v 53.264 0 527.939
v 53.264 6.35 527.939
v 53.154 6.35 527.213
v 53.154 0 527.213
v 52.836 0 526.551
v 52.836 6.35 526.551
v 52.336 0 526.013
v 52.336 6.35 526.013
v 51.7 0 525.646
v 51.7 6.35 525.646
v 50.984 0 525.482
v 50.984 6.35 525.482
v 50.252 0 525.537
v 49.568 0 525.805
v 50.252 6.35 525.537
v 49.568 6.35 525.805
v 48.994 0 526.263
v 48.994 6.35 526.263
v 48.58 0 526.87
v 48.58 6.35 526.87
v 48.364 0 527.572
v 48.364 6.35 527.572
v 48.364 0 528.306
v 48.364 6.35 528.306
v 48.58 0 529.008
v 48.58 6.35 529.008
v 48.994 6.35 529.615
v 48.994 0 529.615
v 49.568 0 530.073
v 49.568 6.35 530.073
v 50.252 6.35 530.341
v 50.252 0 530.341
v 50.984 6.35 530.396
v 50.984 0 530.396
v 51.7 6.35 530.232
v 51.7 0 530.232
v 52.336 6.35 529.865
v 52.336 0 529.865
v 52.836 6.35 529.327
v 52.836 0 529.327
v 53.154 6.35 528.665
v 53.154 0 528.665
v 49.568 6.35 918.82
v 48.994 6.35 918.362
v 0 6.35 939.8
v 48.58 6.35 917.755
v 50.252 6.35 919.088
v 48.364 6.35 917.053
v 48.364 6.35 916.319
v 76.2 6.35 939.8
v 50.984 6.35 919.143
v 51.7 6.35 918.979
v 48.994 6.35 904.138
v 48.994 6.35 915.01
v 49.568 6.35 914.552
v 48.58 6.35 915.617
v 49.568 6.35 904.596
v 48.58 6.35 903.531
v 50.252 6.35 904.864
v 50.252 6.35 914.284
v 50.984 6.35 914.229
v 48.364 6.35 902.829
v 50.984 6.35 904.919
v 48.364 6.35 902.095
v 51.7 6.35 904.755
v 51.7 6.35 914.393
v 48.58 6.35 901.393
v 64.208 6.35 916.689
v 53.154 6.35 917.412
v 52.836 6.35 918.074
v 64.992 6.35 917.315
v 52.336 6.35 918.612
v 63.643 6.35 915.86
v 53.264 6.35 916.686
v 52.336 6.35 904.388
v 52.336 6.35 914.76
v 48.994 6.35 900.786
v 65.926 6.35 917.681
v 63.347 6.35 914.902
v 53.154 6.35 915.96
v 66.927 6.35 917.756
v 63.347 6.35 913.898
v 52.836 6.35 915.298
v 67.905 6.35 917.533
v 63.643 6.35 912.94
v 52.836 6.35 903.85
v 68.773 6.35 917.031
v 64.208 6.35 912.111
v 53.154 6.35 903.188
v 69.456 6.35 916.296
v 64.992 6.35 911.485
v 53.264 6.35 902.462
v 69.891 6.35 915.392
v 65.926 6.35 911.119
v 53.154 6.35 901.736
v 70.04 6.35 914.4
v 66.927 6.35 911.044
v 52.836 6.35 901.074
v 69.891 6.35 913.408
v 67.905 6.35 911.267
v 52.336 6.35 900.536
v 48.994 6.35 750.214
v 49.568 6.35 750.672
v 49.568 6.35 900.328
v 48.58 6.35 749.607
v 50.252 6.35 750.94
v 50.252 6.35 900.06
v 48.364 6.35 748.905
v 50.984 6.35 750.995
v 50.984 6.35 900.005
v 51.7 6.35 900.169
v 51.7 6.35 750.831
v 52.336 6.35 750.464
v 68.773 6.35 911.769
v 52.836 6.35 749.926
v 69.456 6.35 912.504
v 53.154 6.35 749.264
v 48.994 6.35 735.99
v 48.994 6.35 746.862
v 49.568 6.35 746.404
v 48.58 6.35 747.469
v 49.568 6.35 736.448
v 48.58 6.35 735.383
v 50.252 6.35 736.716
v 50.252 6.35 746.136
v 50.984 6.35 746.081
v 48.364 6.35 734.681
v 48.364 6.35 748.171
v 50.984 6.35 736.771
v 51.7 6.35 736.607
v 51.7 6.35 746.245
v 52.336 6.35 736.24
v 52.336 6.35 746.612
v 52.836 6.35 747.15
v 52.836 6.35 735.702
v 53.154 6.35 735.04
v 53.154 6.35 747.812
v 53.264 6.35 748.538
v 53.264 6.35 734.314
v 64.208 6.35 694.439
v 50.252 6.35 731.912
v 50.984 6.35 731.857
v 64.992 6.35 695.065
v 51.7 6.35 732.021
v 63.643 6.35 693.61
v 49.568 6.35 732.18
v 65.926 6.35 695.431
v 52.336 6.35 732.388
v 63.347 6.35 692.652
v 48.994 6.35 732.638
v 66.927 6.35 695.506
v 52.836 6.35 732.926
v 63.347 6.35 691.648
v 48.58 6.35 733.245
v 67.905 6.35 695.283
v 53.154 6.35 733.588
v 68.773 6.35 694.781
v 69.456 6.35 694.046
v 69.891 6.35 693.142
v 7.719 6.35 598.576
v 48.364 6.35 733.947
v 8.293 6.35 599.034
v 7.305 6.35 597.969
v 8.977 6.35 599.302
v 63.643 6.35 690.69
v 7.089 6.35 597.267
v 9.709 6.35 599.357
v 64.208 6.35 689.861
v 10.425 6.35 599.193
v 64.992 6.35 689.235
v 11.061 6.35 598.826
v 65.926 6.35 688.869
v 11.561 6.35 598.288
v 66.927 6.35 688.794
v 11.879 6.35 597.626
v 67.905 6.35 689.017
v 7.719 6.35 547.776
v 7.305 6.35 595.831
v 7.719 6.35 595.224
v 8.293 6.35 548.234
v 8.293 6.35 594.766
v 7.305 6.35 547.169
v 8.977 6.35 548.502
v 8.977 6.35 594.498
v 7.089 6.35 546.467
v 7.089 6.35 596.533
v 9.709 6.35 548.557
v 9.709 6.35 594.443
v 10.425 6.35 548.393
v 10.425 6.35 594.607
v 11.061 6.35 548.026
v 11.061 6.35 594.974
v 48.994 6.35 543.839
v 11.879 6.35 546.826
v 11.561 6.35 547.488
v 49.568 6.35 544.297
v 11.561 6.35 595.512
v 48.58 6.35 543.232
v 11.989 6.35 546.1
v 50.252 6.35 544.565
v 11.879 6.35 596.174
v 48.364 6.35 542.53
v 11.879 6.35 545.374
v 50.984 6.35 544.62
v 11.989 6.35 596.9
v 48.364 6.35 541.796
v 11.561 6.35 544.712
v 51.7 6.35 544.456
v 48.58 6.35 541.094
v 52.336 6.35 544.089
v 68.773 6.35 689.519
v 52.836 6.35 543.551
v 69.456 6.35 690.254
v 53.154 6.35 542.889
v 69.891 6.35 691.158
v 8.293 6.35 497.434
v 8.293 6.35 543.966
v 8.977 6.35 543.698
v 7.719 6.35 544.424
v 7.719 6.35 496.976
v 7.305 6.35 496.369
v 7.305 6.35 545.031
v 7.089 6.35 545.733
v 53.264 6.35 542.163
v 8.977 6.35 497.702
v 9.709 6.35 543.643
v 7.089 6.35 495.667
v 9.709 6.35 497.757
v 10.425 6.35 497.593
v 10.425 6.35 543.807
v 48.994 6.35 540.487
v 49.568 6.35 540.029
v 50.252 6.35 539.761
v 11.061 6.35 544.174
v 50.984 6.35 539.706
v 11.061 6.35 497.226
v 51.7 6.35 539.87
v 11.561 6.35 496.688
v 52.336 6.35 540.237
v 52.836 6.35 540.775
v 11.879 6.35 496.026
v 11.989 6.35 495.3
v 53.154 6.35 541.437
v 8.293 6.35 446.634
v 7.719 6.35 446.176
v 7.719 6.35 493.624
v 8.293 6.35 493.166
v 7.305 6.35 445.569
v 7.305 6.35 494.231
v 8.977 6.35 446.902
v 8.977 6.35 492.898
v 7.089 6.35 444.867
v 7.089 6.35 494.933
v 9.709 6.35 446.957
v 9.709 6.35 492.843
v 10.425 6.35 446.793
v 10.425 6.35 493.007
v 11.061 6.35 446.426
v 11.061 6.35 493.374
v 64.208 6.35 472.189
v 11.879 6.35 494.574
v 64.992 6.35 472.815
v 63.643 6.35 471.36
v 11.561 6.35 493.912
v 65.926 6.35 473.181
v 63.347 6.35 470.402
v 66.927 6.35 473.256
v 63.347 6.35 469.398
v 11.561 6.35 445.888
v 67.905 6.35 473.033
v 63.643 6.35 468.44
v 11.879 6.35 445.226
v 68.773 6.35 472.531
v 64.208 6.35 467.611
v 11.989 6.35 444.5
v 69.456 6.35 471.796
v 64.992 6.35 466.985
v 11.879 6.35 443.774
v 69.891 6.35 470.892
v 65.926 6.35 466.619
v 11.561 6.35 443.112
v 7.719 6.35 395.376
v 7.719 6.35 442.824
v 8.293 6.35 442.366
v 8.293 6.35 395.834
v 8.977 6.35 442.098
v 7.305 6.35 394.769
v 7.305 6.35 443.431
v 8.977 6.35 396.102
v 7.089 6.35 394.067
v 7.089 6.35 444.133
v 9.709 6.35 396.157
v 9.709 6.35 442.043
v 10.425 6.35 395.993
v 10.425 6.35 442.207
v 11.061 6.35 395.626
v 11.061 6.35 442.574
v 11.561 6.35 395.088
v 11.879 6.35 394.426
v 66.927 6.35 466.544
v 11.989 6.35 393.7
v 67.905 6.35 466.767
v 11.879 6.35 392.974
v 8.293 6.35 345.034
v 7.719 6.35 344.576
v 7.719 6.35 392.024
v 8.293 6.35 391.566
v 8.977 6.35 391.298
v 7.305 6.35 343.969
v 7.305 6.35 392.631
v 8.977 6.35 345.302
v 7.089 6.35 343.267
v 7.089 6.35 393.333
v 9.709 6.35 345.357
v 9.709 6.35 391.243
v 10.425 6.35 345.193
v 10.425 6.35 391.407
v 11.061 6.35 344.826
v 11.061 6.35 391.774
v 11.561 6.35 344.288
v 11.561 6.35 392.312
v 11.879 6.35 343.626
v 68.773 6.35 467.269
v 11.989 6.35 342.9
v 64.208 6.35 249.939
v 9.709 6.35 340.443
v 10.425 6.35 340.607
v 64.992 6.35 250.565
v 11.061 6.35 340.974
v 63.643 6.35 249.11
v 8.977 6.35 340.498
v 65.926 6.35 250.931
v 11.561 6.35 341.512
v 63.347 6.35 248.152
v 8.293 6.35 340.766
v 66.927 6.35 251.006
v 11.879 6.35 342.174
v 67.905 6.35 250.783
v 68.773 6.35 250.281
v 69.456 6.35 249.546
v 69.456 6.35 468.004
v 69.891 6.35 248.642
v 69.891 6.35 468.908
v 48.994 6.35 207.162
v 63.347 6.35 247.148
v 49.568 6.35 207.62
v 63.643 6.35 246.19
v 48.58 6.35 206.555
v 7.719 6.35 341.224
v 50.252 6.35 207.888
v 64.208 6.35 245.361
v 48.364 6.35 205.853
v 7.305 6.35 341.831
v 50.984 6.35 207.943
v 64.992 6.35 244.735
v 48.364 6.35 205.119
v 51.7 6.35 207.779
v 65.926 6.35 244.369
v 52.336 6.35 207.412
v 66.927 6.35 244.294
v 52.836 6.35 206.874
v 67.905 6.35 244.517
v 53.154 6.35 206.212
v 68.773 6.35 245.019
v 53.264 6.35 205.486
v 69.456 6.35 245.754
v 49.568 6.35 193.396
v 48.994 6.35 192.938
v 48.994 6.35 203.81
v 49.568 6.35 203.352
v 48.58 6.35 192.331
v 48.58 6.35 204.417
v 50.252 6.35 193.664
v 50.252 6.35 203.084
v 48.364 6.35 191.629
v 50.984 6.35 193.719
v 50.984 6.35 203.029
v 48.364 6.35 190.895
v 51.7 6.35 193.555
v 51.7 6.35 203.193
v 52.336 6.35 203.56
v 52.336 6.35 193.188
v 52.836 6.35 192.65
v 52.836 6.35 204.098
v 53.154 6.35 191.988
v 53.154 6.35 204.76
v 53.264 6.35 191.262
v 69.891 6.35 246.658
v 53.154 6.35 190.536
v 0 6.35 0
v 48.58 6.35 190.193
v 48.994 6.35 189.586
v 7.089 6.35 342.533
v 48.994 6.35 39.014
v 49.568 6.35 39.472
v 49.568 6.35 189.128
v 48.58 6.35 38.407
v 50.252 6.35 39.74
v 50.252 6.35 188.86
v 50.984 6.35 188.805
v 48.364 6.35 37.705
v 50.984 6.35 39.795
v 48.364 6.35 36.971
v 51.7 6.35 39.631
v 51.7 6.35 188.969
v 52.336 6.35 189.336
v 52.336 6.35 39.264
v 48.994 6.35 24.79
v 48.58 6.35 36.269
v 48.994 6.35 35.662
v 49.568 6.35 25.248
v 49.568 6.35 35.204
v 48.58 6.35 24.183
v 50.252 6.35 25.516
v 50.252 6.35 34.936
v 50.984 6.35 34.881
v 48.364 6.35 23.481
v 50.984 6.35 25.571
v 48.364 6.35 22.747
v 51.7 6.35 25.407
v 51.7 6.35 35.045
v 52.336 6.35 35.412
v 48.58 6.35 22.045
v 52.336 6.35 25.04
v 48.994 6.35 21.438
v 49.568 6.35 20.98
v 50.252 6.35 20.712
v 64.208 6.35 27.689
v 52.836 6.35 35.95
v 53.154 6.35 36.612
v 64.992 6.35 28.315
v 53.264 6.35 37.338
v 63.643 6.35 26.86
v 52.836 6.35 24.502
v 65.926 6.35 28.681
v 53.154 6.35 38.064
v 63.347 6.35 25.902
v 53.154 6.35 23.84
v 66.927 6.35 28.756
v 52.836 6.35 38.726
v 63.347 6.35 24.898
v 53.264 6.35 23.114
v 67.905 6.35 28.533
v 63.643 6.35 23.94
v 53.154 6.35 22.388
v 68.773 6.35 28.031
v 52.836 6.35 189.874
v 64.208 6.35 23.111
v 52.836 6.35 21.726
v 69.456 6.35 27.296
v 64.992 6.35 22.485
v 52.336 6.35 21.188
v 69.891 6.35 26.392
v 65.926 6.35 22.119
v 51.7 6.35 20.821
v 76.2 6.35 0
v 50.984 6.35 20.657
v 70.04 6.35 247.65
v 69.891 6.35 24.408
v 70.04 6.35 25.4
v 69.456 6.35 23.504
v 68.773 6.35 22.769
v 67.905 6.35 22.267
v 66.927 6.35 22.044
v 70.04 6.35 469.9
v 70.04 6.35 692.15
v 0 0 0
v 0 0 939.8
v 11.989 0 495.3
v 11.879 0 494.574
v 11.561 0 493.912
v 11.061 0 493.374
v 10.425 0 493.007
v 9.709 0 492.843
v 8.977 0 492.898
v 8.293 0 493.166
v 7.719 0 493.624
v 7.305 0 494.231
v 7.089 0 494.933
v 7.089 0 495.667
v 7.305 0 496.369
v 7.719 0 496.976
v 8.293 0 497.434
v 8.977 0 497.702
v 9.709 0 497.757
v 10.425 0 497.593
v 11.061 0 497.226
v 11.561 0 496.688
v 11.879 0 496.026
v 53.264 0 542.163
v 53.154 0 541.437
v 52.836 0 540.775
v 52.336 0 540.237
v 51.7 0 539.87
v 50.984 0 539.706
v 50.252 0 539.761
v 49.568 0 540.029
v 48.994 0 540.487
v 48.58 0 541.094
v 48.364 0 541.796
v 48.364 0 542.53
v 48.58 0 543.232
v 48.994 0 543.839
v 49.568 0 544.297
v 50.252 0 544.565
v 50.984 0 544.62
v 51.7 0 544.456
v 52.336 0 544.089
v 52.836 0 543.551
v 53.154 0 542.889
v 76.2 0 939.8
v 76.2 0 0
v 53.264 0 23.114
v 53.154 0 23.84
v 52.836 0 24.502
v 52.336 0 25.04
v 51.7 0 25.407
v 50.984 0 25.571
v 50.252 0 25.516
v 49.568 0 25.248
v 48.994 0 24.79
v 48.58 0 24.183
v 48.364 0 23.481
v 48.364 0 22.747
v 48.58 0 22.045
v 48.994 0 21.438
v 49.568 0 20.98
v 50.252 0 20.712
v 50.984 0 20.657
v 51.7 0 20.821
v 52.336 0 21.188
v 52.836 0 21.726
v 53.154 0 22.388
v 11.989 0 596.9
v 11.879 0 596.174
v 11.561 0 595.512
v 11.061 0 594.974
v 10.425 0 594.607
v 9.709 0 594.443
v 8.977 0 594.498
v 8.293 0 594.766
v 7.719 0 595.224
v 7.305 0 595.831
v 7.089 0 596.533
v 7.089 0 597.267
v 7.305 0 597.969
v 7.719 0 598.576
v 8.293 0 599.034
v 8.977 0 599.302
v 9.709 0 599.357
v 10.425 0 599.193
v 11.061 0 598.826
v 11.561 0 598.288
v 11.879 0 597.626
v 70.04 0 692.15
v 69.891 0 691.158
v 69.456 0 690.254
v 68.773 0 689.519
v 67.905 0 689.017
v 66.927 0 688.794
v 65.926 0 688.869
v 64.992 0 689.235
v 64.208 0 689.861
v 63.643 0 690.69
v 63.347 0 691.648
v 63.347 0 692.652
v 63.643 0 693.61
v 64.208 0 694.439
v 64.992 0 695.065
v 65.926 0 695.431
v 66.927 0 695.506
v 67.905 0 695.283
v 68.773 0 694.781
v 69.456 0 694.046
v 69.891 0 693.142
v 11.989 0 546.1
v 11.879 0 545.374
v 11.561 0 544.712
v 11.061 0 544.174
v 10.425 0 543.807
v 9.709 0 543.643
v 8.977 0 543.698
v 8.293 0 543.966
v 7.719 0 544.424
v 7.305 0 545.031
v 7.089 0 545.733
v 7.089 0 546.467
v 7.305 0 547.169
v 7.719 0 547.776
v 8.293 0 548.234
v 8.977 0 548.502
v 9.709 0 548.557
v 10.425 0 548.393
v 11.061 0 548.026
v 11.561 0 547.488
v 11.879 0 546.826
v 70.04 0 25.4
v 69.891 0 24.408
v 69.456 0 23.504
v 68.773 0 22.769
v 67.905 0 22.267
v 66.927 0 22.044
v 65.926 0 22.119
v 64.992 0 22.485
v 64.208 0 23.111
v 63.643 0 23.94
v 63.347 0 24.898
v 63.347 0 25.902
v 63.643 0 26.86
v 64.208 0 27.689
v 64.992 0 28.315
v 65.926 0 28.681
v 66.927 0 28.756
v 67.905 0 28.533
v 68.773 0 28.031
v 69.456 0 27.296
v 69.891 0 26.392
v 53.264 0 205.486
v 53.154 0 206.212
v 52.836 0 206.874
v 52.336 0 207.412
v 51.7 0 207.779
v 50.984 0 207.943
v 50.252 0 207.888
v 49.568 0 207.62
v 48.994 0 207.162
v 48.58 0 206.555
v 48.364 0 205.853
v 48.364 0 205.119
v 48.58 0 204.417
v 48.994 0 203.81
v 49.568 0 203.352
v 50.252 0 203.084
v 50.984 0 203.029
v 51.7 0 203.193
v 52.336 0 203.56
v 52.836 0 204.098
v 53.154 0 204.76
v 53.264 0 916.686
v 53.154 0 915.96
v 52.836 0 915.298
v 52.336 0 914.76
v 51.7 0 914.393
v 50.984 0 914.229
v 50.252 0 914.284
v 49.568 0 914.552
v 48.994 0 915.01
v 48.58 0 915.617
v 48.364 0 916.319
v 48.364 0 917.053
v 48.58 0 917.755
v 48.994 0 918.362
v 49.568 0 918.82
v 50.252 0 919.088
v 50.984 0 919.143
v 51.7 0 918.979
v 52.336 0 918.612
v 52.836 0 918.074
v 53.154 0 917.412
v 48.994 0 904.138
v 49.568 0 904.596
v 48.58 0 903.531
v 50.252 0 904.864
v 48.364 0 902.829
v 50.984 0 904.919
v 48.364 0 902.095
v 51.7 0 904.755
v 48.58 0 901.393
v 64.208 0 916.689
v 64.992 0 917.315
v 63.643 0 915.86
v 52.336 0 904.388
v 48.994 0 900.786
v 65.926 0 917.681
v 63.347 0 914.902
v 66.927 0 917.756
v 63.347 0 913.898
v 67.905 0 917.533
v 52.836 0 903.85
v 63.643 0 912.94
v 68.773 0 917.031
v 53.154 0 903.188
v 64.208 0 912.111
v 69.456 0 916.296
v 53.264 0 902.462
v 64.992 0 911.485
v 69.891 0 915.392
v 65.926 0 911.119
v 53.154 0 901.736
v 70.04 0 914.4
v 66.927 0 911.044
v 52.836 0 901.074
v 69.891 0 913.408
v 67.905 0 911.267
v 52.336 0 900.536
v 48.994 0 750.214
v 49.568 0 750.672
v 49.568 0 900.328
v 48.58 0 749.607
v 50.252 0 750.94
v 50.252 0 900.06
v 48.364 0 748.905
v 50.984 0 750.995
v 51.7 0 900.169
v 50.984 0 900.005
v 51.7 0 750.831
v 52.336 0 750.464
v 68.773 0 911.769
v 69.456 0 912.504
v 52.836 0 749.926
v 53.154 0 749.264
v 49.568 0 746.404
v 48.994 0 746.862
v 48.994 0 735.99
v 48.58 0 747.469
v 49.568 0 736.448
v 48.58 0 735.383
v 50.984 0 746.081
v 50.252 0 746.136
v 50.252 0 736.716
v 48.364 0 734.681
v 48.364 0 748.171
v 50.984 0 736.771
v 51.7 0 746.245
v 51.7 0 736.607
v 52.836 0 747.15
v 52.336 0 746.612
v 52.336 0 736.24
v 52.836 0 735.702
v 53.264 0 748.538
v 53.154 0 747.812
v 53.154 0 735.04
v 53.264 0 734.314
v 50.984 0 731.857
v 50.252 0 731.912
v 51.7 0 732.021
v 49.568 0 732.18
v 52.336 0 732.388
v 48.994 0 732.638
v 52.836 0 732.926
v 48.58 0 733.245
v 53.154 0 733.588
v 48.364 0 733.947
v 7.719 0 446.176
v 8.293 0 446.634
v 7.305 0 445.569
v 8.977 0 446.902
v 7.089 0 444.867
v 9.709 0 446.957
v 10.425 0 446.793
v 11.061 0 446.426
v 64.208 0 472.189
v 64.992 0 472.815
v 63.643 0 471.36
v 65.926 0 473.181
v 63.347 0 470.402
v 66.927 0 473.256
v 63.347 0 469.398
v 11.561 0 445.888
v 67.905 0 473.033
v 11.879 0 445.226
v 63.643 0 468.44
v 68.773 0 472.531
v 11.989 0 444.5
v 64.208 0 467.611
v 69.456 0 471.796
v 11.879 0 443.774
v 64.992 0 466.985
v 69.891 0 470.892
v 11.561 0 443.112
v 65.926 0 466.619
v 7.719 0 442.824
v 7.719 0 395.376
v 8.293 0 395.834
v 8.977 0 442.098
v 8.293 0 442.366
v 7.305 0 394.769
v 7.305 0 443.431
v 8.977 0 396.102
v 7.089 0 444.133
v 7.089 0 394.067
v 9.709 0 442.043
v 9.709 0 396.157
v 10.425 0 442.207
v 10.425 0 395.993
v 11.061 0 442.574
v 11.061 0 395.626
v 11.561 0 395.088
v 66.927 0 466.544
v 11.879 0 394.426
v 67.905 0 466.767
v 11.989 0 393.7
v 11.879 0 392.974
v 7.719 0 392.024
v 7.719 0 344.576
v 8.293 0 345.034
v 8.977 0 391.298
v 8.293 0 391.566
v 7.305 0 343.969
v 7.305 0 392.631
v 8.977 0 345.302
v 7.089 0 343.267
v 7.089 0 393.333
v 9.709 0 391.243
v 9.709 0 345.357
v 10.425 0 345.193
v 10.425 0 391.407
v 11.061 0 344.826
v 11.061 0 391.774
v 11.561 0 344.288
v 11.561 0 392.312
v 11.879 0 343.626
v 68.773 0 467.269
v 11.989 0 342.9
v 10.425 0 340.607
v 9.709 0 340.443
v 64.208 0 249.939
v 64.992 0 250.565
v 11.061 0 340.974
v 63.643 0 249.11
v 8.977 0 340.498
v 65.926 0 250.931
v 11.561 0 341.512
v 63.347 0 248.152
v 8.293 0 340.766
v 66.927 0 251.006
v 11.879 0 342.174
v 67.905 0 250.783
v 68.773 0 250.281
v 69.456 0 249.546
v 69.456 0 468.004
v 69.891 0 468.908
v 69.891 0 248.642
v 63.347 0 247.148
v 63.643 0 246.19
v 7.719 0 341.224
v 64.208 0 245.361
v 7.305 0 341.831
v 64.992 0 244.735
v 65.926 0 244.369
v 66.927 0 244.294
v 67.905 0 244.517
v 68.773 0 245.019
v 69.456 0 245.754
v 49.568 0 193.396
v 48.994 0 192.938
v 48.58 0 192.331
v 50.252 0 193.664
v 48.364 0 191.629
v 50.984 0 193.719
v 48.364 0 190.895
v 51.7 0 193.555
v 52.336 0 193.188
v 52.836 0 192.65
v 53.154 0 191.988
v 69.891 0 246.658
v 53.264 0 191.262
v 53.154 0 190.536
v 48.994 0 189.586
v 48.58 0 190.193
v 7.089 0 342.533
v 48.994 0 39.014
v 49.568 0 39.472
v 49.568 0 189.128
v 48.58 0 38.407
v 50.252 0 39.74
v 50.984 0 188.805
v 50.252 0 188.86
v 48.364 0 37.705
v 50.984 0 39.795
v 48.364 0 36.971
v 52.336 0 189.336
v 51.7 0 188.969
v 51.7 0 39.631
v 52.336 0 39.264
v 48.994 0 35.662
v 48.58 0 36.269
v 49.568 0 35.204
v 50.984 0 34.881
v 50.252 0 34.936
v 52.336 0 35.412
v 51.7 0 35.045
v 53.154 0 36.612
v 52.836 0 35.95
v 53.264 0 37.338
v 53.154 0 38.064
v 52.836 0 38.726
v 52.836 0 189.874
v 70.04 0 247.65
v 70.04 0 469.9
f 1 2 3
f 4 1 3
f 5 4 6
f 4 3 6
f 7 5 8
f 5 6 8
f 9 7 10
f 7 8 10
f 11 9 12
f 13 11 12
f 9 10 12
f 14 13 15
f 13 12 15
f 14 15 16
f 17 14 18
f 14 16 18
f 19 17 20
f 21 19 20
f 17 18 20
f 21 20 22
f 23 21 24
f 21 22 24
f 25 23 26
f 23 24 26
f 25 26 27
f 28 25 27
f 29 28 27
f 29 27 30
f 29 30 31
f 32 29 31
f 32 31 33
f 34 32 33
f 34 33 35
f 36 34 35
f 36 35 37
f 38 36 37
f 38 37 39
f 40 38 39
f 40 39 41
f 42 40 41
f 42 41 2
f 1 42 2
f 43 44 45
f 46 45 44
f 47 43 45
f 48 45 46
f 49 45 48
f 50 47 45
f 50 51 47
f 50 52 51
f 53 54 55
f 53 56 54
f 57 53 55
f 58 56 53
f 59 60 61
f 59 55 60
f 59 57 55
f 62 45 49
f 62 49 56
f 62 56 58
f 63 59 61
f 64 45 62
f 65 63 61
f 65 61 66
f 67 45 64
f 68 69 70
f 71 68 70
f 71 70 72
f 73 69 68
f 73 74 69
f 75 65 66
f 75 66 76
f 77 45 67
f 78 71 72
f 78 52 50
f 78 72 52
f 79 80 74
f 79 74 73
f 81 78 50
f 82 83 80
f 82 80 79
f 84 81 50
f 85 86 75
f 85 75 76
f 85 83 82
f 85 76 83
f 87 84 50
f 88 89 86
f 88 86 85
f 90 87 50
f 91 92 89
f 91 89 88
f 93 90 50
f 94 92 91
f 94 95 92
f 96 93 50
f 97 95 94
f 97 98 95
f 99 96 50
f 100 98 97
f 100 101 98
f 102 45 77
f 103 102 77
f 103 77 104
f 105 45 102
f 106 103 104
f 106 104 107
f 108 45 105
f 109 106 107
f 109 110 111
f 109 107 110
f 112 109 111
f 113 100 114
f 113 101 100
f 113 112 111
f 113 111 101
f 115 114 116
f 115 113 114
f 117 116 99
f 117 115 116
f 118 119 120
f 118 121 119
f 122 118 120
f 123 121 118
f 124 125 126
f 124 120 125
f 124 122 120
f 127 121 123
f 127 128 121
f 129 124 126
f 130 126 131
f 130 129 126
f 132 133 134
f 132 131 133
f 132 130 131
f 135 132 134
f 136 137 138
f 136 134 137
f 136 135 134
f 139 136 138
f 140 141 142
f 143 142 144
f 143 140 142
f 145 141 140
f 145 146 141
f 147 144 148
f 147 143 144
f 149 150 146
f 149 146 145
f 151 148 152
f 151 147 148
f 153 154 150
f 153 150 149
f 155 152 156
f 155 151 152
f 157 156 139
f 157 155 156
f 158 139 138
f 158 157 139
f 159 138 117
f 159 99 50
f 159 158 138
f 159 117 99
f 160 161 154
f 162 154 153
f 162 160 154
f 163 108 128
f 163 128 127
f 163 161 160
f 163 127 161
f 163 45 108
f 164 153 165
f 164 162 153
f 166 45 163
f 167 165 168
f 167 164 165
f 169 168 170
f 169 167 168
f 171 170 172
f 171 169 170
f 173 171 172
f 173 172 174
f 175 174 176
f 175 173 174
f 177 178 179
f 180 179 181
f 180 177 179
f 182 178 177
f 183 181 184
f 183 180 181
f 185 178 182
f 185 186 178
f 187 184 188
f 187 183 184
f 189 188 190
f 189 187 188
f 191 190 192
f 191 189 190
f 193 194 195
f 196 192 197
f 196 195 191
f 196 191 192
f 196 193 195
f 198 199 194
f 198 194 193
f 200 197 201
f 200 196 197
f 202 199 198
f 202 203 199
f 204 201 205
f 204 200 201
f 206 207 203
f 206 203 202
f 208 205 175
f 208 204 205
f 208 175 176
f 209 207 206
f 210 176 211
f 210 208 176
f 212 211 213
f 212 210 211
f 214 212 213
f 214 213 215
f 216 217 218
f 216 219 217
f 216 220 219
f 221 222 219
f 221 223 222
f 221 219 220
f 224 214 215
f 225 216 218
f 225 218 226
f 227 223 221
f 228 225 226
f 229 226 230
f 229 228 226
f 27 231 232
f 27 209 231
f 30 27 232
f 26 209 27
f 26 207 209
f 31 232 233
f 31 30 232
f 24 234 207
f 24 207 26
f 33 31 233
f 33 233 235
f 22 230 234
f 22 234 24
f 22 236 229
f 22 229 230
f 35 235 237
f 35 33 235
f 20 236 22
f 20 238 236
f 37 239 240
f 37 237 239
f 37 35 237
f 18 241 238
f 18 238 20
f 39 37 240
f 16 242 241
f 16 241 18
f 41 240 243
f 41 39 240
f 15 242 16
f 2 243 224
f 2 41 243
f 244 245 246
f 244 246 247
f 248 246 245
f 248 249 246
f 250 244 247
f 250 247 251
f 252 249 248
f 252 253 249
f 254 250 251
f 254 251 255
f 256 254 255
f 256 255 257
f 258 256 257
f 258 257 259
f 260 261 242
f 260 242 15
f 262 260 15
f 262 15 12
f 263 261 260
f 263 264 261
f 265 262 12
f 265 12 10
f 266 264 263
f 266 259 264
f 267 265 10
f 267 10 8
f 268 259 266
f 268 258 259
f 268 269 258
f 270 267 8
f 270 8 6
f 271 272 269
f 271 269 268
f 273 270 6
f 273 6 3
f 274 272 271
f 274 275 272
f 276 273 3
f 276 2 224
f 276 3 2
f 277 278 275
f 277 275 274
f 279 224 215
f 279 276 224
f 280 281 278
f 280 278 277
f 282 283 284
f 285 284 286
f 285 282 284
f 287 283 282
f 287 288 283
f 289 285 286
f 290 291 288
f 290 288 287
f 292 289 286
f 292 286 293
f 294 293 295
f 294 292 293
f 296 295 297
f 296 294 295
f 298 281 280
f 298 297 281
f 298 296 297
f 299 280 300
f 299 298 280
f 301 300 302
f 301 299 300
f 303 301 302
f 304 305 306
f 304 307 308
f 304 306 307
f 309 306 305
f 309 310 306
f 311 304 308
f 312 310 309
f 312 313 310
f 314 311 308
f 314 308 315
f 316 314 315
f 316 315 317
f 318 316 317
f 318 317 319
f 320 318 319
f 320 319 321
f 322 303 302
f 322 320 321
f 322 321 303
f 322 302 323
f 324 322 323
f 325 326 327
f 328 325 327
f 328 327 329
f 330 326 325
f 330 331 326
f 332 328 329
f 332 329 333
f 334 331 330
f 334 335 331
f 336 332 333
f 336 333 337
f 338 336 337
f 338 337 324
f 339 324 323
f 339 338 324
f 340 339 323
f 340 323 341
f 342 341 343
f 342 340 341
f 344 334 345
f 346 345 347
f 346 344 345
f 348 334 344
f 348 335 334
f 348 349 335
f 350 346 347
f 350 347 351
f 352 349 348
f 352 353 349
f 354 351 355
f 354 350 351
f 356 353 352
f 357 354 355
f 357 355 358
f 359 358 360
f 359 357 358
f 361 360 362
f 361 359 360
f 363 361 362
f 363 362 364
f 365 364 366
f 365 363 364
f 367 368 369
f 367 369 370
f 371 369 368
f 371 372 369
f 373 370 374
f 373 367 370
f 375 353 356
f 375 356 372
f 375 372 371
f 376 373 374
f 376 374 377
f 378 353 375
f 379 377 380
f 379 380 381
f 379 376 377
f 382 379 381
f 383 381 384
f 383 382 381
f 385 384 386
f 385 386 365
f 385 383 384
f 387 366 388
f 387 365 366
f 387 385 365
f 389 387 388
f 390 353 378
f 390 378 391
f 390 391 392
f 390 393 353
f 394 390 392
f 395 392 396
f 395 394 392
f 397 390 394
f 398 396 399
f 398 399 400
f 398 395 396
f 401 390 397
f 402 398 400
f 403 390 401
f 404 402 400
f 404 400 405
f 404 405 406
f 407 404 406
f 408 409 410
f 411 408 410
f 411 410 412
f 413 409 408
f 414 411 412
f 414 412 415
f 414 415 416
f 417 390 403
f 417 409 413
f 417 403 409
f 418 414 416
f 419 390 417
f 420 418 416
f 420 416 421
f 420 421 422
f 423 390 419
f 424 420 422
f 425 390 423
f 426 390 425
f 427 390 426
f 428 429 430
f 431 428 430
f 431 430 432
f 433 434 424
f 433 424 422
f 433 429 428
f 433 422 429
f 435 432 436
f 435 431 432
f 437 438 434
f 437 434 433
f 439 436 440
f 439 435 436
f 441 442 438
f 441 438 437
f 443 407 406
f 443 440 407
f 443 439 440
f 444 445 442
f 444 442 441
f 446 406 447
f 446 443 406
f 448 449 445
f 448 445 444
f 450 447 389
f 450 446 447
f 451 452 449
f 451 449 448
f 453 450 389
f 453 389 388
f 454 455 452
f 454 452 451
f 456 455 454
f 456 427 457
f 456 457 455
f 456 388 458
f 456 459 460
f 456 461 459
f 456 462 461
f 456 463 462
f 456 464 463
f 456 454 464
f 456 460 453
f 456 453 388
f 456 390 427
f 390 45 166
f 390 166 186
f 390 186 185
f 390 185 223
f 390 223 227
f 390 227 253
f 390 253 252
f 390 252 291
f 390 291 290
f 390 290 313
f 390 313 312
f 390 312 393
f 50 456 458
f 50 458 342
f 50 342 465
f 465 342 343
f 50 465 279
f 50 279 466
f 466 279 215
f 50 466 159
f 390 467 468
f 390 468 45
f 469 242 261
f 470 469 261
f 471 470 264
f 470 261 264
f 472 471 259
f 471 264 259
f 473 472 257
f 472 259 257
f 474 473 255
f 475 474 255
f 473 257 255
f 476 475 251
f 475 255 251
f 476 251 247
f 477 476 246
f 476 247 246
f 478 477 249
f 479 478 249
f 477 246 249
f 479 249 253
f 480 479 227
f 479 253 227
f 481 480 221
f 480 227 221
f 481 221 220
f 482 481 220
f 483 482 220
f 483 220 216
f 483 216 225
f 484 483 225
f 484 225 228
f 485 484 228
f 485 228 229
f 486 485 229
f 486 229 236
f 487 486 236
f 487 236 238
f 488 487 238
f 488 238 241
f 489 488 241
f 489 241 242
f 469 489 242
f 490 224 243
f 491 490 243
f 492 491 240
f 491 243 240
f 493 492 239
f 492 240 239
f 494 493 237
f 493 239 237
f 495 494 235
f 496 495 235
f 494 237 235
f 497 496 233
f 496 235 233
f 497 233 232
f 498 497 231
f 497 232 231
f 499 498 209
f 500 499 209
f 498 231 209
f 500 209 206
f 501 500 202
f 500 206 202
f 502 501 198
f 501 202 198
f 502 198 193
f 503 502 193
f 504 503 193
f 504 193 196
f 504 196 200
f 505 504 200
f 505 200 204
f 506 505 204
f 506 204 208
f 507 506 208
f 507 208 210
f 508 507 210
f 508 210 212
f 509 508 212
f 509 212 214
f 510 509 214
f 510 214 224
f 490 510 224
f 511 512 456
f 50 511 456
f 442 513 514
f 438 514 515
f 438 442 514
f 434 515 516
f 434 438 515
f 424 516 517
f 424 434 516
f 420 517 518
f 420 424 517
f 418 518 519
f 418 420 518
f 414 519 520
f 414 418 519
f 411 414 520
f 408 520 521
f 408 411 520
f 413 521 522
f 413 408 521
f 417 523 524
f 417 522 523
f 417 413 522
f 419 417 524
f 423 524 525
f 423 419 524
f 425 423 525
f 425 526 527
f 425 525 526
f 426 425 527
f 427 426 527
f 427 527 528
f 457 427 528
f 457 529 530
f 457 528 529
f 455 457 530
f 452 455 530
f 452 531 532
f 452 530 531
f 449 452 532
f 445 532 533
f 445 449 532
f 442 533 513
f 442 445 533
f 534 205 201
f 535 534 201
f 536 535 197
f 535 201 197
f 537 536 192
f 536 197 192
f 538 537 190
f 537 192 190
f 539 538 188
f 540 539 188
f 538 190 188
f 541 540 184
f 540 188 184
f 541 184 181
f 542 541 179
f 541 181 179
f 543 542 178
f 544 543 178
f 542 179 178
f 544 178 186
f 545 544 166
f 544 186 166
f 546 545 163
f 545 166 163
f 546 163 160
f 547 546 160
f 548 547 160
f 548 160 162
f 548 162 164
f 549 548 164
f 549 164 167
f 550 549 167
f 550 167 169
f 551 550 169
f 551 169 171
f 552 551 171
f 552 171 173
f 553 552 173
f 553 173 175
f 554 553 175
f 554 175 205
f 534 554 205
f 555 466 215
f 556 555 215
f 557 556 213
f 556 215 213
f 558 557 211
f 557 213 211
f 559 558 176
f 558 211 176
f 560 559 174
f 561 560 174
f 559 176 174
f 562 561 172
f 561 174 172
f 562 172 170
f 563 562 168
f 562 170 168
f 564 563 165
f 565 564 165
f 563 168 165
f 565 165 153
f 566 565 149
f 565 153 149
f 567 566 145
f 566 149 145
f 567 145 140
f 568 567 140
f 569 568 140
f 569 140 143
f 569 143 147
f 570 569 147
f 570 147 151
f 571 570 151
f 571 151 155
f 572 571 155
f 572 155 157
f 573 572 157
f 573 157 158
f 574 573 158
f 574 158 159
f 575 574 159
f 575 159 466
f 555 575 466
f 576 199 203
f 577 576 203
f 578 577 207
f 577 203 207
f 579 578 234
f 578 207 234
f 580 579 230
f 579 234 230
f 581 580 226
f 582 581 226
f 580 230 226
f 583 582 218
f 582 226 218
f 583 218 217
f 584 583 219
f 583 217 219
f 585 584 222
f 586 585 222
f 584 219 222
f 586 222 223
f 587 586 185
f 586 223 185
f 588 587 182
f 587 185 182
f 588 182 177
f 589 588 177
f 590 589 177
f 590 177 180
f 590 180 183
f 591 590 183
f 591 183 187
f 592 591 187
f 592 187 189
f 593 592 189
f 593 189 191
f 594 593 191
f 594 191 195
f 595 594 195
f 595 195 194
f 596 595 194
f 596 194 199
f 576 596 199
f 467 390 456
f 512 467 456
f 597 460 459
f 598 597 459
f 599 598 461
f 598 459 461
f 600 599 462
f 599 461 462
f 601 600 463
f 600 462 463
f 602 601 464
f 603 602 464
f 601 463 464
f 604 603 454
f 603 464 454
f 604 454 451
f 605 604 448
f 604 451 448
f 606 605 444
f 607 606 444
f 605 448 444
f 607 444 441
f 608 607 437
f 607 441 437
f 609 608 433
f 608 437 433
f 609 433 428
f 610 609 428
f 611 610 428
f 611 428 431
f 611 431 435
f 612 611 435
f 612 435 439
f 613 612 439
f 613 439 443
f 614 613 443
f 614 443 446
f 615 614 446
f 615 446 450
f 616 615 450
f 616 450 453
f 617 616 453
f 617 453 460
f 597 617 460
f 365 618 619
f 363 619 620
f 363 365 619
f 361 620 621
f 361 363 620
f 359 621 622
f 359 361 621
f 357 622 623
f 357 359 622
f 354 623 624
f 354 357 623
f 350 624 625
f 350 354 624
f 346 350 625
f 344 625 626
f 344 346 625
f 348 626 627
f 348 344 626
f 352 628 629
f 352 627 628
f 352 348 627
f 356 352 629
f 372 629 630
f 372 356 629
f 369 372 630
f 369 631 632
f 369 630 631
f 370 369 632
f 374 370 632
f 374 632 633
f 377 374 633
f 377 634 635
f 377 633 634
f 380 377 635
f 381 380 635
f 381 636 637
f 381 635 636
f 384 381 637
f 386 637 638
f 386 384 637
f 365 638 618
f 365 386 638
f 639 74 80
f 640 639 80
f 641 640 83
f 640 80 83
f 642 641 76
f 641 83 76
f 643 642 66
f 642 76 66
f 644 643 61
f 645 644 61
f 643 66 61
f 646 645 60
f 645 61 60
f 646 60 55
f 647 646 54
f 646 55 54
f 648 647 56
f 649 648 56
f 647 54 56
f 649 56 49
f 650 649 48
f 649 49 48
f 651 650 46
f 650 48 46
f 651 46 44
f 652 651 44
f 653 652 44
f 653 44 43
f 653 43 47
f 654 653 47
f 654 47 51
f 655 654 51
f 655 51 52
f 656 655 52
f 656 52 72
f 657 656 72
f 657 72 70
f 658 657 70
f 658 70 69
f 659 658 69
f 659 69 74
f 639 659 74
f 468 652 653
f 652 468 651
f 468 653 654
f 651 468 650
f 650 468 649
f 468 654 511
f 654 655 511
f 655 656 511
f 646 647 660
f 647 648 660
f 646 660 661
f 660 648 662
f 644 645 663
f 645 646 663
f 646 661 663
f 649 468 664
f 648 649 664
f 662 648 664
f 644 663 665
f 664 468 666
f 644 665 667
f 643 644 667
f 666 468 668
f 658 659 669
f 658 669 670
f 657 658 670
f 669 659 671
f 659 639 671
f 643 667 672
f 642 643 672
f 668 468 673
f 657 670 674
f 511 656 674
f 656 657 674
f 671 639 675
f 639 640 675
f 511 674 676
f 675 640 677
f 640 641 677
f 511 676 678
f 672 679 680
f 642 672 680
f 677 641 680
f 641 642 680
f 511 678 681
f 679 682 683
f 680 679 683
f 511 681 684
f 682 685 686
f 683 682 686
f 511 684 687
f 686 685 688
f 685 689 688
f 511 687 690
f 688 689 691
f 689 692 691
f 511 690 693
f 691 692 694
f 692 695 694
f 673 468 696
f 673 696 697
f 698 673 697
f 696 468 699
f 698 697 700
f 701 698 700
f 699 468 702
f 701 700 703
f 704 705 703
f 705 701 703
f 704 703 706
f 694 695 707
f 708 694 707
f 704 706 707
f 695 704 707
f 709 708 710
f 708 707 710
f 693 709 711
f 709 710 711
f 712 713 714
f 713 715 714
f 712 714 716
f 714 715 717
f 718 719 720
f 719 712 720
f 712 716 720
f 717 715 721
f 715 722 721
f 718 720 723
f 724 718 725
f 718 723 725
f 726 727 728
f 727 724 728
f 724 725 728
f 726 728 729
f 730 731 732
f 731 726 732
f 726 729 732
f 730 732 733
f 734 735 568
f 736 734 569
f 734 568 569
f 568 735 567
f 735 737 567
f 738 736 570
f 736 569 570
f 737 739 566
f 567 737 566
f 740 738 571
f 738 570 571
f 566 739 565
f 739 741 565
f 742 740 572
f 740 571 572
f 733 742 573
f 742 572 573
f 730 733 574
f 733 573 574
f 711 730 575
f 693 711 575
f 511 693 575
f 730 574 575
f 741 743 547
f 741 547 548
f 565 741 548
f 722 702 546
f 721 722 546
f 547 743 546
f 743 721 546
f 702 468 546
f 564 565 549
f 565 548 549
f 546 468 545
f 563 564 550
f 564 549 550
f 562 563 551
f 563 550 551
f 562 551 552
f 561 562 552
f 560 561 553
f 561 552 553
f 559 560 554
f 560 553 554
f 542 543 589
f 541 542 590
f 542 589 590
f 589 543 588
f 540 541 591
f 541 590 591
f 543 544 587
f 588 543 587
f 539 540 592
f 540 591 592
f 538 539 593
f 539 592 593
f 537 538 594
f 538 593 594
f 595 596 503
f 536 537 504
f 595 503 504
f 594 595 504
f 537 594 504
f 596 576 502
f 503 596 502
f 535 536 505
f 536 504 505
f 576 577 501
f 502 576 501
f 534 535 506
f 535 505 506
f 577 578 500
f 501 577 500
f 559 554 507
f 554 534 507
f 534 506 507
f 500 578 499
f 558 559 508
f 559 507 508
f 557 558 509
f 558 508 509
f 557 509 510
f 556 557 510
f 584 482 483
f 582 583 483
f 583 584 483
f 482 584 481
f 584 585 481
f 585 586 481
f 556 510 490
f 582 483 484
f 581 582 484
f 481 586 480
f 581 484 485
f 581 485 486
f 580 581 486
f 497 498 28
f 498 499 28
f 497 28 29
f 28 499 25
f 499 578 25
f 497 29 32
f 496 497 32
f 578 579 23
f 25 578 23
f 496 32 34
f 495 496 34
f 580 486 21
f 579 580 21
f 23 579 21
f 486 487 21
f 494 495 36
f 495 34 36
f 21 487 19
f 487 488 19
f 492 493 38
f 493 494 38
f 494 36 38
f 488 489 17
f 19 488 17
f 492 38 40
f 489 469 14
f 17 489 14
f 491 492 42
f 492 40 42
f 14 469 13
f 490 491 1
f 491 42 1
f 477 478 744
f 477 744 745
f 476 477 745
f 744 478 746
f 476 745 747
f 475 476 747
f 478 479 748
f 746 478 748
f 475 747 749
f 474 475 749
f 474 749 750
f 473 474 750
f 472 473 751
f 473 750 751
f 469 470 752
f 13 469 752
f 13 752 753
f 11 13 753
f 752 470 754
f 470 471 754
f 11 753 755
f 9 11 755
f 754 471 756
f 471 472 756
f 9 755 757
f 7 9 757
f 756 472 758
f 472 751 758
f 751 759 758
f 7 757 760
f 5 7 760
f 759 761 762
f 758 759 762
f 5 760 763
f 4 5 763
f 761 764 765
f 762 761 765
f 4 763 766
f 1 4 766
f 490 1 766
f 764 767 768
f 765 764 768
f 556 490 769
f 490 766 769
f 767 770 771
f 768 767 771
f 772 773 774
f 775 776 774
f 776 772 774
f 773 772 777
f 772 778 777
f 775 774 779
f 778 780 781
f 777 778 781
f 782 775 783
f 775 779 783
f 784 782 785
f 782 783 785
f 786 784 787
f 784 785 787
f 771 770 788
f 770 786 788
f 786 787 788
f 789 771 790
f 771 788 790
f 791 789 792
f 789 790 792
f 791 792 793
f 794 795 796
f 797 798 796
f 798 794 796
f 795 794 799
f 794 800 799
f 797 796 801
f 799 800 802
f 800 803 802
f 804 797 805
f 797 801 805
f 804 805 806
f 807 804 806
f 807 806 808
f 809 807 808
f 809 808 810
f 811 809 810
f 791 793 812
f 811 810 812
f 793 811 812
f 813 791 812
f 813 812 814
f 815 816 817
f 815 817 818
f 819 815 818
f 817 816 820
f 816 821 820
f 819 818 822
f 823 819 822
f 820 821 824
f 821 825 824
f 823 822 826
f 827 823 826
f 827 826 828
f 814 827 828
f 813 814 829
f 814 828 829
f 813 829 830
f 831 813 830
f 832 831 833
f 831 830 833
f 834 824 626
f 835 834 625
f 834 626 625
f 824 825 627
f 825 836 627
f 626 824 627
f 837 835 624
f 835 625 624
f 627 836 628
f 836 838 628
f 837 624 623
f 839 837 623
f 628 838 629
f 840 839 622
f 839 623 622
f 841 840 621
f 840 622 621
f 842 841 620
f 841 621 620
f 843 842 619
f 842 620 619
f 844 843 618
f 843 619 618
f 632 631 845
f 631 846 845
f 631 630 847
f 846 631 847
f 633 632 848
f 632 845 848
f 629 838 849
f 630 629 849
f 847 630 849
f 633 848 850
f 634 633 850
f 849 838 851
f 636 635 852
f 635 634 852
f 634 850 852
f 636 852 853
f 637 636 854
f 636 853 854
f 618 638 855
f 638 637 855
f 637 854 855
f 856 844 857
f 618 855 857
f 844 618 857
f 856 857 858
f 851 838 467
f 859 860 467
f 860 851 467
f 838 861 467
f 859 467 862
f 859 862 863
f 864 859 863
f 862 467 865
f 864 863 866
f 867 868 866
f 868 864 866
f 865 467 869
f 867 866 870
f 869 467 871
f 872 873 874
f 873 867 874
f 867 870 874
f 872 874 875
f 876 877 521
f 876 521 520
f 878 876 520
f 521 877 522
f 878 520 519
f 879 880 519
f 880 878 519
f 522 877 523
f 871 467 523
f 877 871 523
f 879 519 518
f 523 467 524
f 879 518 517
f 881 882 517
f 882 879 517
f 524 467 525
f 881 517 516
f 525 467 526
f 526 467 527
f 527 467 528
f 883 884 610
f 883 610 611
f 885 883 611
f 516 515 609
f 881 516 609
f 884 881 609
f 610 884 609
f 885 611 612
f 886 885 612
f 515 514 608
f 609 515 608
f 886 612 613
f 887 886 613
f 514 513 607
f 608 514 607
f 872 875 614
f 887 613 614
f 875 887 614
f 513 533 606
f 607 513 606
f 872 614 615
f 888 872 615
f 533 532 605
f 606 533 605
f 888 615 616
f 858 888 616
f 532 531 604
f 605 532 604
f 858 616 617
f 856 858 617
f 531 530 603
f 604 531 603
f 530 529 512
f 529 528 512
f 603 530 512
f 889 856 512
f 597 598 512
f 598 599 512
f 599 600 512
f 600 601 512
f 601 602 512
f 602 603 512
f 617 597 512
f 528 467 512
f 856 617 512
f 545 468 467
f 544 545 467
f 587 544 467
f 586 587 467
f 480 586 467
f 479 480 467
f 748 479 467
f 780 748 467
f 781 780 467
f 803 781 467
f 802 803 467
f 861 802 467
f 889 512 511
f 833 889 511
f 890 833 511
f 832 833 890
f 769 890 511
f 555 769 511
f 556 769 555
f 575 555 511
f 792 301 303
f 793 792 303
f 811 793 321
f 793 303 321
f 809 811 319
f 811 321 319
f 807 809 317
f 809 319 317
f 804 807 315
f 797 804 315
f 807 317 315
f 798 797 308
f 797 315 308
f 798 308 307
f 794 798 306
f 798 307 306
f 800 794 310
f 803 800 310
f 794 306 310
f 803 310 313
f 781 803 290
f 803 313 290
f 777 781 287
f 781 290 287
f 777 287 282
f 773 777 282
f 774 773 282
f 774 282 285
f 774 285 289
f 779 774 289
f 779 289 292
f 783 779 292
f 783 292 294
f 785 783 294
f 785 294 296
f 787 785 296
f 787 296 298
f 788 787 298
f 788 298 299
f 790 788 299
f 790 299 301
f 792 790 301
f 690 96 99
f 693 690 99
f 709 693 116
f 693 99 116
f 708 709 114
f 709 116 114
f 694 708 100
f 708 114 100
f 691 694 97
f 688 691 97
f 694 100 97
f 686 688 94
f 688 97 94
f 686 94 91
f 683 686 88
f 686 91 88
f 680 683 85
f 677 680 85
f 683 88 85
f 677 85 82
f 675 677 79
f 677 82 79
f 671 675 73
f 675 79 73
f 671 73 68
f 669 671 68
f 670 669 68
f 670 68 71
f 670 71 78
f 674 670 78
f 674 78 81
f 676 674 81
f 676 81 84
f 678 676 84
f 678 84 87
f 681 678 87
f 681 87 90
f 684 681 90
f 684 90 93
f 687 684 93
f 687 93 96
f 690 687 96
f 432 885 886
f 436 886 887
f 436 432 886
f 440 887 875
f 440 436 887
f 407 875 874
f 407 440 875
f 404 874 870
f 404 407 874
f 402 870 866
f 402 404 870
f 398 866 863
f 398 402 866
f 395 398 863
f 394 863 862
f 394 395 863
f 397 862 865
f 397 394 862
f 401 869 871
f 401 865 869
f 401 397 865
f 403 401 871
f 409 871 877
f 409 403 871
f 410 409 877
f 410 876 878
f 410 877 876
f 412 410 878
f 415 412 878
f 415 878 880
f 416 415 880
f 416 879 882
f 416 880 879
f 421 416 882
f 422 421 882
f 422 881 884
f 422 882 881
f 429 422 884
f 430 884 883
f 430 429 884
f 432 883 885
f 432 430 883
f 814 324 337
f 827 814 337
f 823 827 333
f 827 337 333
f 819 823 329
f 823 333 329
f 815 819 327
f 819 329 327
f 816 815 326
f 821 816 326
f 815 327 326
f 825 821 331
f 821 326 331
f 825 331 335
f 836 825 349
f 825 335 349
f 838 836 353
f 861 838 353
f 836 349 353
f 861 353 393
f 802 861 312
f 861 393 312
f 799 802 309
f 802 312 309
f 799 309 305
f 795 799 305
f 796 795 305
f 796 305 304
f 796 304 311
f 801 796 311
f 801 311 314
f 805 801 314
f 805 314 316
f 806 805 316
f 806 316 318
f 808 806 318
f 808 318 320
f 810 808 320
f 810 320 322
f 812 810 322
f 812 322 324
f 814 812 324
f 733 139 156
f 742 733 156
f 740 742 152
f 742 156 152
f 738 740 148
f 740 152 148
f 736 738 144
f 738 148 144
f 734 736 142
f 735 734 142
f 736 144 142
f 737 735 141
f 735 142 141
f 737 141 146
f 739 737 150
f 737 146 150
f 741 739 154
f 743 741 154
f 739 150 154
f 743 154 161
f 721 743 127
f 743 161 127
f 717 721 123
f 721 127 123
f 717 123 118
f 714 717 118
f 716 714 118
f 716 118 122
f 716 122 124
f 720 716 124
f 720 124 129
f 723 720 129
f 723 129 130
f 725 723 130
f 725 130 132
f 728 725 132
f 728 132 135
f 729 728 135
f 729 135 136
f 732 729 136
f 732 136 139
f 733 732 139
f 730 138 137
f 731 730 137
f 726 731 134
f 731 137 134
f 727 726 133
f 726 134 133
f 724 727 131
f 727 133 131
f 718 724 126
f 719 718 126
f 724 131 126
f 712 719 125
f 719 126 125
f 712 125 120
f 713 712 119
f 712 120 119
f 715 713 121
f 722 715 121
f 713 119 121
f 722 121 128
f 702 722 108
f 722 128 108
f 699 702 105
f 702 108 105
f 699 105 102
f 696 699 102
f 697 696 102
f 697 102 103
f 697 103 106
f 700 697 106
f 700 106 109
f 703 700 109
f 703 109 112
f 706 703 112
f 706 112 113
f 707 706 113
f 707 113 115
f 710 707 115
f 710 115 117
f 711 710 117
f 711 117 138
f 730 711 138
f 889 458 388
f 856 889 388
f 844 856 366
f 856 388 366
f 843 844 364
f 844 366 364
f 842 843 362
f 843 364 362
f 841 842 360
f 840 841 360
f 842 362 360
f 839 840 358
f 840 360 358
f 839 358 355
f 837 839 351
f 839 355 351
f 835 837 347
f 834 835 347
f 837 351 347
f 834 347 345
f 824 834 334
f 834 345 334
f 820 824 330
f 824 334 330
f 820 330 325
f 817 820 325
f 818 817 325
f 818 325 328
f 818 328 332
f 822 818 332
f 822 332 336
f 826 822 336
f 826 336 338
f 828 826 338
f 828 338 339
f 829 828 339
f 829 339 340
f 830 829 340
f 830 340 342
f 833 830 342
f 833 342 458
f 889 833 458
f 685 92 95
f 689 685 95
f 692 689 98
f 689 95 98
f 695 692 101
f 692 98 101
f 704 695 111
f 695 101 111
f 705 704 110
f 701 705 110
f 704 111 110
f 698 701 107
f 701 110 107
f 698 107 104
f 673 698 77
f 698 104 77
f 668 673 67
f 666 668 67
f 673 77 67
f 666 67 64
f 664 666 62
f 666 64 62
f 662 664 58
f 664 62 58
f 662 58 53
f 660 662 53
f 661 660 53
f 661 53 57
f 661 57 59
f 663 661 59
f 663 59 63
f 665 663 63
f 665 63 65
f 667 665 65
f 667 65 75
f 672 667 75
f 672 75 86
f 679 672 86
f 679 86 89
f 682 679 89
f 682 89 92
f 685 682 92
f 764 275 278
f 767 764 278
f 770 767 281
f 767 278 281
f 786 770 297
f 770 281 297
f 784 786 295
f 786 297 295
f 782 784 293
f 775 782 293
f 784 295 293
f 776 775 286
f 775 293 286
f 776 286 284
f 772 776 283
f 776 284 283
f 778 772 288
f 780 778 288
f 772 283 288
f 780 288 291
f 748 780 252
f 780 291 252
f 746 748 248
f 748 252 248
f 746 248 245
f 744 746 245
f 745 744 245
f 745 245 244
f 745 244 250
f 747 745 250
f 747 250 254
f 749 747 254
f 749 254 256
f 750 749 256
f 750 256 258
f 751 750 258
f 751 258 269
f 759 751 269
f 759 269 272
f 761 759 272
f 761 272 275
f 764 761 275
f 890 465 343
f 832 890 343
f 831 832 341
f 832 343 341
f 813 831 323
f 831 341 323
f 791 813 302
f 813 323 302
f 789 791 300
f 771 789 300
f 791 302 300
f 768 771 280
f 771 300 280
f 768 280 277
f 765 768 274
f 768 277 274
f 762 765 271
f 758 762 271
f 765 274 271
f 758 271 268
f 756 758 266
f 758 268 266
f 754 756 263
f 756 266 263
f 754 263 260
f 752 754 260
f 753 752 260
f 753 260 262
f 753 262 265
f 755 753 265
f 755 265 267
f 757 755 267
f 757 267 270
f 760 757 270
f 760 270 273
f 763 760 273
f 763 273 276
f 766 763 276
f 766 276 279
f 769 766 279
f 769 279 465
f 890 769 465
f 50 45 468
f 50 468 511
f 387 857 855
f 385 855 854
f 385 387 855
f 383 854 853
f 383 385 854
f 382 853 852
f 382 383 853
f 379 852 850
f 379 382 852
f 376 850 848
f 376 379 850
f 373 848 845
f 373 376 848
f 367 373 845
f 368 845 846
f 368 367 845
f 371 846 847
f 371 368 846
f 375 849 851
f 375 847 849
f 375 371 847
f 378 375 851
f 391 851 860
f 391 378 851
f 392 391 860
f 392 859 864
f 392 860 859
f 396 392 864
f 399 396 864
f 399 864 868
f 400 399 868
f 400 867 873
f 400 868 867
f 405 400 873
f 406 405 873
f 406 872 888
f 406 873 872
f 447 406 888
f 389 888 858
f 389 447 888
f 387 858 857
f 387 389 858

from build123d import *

# Parameters (mm, degrees)
SKETCH1_W               = 76.2
SKETCH1_H               = 6.35
BOSS_EXTRUDE1_DEPTH     = 939.8
SKETCH2_R               = 2.4638
CUT_EXTRUDE1_DEPTH      = 7.35
LPATTERN1_COUNT         = 6
LPATTERN1_PITCH         = 50.8
SKETCH3_R               = 2.4638
CUT_EXTRUDE2_DEPTH      = 7.35
SKETCH4_R               = 2.4638
CUT_EXTRUDE3_DEPTH      = 7.35
SKETCH5_R               = 3.3655
CUT_EXTRUDE4_DEPTH      = 1
CUT_EXTRUDE4_DEPTH_BACK = 7.35


with BuildPart() as part:
    # Sketch1 → Boss-Extrude1 (new body)
    with BuildSketch(Plane.XY):
        with Locations((38.1, 3.175)):
            Rectangle(SKETCH1_W, SKETCH1_H)
    extrude(amount=BOSS_EXTRUDE1_DEPTH)

    # Sketch2 → Cut-Extrude1 (cut, through all)
    with BuildSketch(Plane(origin=(0, 6.35, 0), x_dir=(1, 0, 0), z_dir=(0, 1, 0))):
        with Locations((9.525, -596.9)):
            Circle(SKETCH2_R)
    cut_extrude1 = extrude(amount=-CUT_EXTRUDE1_DEPTH, mode=Mode.SUBTRACT)

    # LPattern1: Cut-Extrude1 ×6
    with Locations(*[(0, 0, -i * LPATTERN1_PITCH) for i in range(1, LPATTERN1_COUNT)]):
        add(cut_extrude1, mode=Mode.SUBTRACT)

    # Sketch3 → Cut-Extrude2 (cut, through all)
    with BuildSketch(Plane(origin=(0, 6.35, 0), x_dir=(1, 0, 0), z_dir=(0, 1, 0))):
        with Locations((50.8, -527.939)):
            Circle(SKETCH3_R)
        with Locations((50.8, -542.163)):
            Circle(SKETCH3_R)
    extrude(amount=-CUT_EXTRUDE2_DEPTH, mode=Mode.SUBTRACT)

    # Sketch4 → Cut-Extrude3 (cut, through all)
    with BuildSketch(Plane(origin=(0, 6.35, 0), x_dir=(1, 0, 0), z_dir=(0, 1, 0))):
        with Locations((50.8, -916.686)):
            Circle(SKETCH4_R)
        with Locations((50.8, -902.462)):
            Circle(SKETCH4_R)
        with Locations((50.8, -748.538)):
            Circle(SKETCH4_R)
        with Locations((50.8, -734.314)):
            Circle(SKETCH4_R)
    cut_extrude3 = extrude(amount=-CUT_EXTRUDE3_DEPTH, mode=Mode.SUBTRACT)

    # Mirror1: Cut-Extrude3 across plane
    add(cut_extrude3.mirror(Plane.XY.offset(469.9)), mode=Mode.SUBTRACT)

    # Sketch5 → Cut-Extrude4 (cut, two sides)
    with BuildSketch(Plane(origin=(0, 6.35, 0), x_dir=(1, 0, 0), z_dir=(0, 1, 0))) as cut_extrude4_sk:
        with Locations((66.675, -469.9)):
            Circle(SKETCH5_R)
        with Locations((66.675, -247.65)):
            Circle(SKETCH5_R)
        with Locations((66.675, -25.4)):
            Circle(SKETCH5_R)
        with Locations((66.675, -692.15)):
            Circle(SKETCH5_R)
        with Locations((66.675, -914.4)):
            Circle(SKETCH5_R)
    extrude(amount=CUT_EXTRUDE4_DEPTH, mode=Mode.SUBTRACT)
    extrude(cut_extrude4_sk.sketch, amount=-CUT_EXTRUDE4_DEPTH_BACK, mode=Mode.SUBTRACT)


solid = part.part
